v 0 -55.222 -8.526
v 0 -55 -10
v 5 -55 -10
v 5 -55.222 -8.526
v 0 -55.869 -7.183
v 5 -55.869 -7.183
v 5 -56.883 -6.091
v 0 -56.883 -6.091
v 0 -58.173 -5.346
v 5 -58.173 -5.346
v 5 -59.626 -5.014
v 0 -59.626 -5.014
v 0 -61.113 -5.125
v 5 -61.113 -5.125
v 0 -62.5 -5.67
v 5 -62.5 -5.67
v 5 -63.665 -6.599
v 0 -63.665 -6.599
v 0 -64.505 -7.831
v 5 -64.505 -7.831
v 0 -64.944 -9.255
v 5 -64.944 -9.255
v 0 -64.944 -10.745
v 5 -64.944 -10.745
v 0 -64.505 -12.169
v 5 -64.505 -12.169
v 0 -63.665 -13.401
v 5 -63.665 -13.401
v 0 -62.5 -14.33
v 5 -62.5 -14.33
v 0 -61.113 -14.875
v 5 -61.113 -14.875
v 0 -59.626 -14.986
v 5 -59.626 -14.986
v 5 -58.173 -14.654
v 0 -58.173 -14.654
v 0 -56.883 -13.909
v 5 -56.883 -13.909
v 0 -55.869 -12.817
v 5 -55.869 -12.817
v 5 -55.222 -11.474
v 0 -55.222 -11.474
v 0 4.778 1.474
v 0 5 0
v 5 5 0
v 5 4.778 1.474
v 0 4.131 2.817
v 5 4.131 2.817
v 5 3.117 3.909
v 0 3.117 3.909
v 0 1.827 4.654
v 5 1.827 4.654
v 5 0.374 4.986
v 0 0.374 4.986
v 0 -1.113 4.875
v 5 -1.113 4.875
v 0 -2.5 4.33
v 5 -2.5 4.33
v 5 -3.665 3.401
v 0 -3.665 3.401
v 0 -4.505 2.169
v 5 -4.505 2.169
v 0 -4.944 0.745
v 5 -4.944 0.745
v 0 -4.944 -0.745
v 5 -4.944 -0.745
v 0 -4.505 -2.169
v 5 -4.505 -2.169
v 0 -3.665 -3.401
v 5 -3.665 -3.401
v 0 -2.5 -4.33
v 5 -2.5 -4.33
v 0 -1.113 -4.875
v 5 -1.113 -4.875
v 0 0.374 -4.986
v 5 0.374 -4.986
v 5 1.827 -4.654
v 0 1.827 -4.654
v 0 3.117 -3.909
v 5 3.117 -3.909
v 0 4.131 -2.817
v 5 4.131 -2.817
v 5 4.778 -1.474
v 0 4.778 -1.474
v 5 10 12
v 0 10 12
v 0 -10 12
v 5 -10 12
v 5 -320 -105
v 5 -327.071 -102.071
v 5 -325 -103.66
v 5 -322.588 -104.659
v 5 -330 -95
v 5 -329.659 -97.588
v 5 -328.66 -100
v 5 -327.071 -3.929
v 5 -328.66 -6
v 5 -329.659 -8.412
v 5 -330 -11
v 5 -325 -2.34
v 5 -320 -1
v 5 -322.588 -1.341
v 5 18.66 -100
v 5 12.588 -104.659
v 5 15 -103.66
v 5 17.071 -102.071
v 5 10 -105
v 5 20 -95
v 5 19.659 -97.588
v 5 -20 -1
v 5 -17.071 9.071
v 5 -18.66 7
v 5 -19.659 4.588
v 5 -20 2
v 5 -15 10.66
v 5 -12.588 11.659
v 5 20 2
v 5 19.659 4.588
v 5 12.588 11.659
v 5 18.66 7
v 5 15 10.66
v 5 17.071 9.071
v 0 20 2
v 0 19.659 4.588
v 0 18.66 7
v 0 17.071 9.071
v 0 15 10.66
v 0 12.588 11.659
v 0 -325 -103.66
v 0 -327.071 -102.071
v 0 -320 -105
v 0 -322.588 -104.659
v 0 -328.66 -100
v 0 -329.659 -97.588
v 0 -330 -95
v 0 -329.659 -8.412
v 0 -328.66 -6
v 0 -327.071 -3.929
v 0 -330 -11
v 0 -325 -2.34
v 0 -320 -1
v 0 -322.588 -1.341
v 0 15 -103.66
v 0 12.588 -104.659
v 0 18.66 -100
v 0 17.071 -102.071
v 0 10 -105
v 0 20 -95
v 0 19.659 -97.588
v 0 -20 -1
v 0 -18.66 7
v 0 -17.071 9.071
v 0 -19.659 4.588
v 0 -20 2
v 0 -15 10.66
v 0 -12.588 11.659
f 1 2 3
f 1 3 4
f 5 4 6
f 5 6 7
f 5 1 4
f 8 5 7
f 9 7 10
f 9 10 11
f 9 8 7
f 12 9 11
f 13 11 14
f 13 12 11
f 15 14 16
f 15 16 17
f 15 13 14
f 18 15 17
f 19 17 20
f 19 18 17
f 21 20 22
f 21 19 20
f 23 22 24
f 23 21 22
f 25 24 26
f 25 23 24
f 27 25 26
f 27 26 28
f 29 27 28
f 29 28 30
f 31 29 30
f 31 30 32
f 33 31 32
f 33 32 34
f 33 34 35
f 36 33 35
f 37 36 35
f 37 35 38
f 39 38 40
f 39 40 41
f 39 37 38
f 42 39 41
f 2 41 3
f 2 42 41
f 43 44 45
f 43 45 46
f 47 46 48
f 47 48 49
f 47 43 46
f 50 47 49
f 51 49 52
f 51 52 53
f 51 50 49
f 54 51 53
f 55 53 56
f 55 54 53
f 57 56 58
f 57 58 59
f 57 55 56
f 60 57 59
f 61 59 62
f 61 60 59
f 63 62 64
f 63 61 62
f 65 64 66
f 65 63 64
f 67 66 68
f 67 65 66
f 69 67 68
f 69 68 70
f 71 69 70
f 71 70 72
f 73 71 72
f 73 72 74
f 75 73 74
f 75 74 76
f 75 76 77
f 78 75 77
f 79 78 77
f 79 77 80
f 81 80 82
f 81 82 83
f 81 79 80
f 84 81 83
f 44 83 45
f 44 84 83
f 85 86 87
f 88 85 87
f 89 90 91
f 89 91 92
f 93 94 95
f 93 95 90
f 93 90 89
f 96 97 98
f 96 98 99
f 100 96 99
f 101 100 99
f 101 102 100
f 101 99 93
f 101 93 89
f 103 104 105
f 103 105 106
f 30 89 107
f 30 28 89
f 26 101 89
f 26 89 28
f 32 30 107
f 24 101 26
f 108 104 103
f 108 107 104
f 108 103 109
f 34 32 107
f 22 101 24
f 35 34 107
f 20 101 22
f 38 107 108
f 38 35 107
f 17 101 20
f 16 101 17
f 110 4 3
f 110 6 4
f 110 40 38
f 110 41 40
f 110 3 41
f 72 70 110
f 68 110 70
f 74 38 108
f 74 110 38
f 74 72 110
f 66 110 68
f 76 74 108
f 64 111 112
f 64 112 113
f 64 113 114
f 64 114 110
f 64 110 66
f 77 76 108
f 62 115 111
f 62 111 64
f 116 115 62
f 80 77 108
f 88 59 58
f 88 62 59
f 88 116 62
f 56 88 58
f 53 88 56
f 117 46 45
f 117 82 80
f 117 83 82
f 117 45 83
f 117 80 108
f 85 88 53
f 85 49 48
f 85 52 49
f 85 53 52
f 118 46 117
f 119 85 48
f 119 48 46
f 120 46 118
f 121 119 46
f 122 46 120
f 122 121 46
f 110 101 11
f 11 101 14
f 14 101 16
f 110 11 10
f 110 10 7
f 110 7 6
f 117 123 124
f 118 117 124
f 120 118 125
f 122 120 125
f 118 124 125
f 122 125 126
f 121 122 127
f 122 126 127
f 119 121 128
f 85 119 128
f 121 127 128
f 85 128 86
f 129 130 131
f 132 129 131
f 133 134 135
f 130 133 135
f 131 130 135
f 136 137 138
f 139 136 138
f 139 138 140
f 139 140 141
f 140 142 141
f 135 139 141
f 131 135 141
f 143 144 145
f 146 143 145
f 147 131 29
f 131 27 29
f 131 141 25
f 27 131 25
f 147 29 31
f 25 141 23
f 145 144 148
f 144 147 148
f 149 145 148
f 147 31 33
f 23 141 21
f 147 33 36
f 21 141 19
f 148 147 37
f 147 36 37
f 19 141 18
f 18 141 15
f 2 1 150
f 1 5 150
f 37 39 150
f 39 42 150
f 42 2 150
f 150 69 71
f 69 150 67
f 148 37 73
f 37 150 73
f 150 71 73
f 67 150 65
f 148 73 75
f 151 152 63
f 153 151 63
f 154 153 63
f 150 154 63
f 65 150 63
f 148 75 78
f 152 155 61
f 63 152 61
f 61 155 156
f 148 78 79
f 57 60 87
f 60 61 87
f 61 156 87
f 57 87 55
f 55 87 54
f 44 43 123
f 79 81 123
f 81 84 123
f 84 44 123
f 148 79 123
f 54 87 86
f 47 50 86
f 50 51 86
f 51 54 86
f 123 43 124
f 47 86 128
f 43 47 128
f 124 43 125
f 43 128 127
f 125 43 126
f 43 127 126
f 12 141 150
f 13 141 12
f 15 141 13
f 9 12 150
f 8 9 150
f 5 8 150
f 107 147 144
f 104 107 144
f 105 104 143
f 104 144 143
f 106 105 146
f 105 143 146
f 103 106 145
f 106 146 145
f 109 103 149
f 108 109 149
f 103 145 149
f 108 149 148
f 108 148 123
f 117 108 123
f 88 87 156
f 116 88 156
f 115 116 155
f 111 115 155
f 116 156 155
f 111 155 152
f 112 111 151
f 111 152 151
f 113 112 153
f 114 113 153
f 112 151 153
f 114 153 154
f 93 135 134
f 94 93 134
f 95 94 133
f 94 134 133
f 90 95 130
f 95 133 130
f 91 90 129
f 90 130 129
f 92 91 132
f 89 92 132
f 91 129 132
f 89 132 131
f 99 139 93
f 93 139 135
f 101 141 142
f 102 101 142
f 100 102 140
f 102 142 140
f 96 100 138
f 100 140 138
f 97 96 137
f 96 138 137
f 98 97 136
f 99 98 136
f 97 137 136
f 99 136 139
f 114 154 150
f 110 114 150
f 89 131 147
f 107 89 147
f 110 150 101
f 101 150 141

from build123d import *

# Parameters (mm, degrees)
F0_R     = 5
F1_DEPTH = 5


with BuildPart() as f1:
    # F0 (on Right) → F1 (new body)
    with BuildSketch(Plane.YZ):
        with BuildLine():
            Line((-20, -1), (-320, -1))
            ThreePointArc((-320, -1), (-327.071068, -3.928932), (-330, -11))
            Line((-330, -11), (-330, -95))
            ThreePointArc((-330, -95), (-327.071068, -102.071068), (-320, -105))
            Line((-320, -105), (10, -105))
            ThreePointArc((10, -105), (17.071068, -102.071068), (20, -95))
            Line((20, -95), (20, 2))
            ThreePointArc((20, 2), (17.071068, 9.071068), (10, 12))
            Line((10, 12), (-10, 12))
            ThreePointArc((-10, 12), (-17.071068, 9.071068), (-20, 2))
            Line((-20, 2), (-20, -1))
        make_face()
        with Locations((-60, -10)):
            Circle(F0_R, mode=Mode.SUBTRACT)
        Circle(F0_R, mode=Mode.SUBTRACT)
    extrude(amount=F1_DEPTH)


solid = f1.part
